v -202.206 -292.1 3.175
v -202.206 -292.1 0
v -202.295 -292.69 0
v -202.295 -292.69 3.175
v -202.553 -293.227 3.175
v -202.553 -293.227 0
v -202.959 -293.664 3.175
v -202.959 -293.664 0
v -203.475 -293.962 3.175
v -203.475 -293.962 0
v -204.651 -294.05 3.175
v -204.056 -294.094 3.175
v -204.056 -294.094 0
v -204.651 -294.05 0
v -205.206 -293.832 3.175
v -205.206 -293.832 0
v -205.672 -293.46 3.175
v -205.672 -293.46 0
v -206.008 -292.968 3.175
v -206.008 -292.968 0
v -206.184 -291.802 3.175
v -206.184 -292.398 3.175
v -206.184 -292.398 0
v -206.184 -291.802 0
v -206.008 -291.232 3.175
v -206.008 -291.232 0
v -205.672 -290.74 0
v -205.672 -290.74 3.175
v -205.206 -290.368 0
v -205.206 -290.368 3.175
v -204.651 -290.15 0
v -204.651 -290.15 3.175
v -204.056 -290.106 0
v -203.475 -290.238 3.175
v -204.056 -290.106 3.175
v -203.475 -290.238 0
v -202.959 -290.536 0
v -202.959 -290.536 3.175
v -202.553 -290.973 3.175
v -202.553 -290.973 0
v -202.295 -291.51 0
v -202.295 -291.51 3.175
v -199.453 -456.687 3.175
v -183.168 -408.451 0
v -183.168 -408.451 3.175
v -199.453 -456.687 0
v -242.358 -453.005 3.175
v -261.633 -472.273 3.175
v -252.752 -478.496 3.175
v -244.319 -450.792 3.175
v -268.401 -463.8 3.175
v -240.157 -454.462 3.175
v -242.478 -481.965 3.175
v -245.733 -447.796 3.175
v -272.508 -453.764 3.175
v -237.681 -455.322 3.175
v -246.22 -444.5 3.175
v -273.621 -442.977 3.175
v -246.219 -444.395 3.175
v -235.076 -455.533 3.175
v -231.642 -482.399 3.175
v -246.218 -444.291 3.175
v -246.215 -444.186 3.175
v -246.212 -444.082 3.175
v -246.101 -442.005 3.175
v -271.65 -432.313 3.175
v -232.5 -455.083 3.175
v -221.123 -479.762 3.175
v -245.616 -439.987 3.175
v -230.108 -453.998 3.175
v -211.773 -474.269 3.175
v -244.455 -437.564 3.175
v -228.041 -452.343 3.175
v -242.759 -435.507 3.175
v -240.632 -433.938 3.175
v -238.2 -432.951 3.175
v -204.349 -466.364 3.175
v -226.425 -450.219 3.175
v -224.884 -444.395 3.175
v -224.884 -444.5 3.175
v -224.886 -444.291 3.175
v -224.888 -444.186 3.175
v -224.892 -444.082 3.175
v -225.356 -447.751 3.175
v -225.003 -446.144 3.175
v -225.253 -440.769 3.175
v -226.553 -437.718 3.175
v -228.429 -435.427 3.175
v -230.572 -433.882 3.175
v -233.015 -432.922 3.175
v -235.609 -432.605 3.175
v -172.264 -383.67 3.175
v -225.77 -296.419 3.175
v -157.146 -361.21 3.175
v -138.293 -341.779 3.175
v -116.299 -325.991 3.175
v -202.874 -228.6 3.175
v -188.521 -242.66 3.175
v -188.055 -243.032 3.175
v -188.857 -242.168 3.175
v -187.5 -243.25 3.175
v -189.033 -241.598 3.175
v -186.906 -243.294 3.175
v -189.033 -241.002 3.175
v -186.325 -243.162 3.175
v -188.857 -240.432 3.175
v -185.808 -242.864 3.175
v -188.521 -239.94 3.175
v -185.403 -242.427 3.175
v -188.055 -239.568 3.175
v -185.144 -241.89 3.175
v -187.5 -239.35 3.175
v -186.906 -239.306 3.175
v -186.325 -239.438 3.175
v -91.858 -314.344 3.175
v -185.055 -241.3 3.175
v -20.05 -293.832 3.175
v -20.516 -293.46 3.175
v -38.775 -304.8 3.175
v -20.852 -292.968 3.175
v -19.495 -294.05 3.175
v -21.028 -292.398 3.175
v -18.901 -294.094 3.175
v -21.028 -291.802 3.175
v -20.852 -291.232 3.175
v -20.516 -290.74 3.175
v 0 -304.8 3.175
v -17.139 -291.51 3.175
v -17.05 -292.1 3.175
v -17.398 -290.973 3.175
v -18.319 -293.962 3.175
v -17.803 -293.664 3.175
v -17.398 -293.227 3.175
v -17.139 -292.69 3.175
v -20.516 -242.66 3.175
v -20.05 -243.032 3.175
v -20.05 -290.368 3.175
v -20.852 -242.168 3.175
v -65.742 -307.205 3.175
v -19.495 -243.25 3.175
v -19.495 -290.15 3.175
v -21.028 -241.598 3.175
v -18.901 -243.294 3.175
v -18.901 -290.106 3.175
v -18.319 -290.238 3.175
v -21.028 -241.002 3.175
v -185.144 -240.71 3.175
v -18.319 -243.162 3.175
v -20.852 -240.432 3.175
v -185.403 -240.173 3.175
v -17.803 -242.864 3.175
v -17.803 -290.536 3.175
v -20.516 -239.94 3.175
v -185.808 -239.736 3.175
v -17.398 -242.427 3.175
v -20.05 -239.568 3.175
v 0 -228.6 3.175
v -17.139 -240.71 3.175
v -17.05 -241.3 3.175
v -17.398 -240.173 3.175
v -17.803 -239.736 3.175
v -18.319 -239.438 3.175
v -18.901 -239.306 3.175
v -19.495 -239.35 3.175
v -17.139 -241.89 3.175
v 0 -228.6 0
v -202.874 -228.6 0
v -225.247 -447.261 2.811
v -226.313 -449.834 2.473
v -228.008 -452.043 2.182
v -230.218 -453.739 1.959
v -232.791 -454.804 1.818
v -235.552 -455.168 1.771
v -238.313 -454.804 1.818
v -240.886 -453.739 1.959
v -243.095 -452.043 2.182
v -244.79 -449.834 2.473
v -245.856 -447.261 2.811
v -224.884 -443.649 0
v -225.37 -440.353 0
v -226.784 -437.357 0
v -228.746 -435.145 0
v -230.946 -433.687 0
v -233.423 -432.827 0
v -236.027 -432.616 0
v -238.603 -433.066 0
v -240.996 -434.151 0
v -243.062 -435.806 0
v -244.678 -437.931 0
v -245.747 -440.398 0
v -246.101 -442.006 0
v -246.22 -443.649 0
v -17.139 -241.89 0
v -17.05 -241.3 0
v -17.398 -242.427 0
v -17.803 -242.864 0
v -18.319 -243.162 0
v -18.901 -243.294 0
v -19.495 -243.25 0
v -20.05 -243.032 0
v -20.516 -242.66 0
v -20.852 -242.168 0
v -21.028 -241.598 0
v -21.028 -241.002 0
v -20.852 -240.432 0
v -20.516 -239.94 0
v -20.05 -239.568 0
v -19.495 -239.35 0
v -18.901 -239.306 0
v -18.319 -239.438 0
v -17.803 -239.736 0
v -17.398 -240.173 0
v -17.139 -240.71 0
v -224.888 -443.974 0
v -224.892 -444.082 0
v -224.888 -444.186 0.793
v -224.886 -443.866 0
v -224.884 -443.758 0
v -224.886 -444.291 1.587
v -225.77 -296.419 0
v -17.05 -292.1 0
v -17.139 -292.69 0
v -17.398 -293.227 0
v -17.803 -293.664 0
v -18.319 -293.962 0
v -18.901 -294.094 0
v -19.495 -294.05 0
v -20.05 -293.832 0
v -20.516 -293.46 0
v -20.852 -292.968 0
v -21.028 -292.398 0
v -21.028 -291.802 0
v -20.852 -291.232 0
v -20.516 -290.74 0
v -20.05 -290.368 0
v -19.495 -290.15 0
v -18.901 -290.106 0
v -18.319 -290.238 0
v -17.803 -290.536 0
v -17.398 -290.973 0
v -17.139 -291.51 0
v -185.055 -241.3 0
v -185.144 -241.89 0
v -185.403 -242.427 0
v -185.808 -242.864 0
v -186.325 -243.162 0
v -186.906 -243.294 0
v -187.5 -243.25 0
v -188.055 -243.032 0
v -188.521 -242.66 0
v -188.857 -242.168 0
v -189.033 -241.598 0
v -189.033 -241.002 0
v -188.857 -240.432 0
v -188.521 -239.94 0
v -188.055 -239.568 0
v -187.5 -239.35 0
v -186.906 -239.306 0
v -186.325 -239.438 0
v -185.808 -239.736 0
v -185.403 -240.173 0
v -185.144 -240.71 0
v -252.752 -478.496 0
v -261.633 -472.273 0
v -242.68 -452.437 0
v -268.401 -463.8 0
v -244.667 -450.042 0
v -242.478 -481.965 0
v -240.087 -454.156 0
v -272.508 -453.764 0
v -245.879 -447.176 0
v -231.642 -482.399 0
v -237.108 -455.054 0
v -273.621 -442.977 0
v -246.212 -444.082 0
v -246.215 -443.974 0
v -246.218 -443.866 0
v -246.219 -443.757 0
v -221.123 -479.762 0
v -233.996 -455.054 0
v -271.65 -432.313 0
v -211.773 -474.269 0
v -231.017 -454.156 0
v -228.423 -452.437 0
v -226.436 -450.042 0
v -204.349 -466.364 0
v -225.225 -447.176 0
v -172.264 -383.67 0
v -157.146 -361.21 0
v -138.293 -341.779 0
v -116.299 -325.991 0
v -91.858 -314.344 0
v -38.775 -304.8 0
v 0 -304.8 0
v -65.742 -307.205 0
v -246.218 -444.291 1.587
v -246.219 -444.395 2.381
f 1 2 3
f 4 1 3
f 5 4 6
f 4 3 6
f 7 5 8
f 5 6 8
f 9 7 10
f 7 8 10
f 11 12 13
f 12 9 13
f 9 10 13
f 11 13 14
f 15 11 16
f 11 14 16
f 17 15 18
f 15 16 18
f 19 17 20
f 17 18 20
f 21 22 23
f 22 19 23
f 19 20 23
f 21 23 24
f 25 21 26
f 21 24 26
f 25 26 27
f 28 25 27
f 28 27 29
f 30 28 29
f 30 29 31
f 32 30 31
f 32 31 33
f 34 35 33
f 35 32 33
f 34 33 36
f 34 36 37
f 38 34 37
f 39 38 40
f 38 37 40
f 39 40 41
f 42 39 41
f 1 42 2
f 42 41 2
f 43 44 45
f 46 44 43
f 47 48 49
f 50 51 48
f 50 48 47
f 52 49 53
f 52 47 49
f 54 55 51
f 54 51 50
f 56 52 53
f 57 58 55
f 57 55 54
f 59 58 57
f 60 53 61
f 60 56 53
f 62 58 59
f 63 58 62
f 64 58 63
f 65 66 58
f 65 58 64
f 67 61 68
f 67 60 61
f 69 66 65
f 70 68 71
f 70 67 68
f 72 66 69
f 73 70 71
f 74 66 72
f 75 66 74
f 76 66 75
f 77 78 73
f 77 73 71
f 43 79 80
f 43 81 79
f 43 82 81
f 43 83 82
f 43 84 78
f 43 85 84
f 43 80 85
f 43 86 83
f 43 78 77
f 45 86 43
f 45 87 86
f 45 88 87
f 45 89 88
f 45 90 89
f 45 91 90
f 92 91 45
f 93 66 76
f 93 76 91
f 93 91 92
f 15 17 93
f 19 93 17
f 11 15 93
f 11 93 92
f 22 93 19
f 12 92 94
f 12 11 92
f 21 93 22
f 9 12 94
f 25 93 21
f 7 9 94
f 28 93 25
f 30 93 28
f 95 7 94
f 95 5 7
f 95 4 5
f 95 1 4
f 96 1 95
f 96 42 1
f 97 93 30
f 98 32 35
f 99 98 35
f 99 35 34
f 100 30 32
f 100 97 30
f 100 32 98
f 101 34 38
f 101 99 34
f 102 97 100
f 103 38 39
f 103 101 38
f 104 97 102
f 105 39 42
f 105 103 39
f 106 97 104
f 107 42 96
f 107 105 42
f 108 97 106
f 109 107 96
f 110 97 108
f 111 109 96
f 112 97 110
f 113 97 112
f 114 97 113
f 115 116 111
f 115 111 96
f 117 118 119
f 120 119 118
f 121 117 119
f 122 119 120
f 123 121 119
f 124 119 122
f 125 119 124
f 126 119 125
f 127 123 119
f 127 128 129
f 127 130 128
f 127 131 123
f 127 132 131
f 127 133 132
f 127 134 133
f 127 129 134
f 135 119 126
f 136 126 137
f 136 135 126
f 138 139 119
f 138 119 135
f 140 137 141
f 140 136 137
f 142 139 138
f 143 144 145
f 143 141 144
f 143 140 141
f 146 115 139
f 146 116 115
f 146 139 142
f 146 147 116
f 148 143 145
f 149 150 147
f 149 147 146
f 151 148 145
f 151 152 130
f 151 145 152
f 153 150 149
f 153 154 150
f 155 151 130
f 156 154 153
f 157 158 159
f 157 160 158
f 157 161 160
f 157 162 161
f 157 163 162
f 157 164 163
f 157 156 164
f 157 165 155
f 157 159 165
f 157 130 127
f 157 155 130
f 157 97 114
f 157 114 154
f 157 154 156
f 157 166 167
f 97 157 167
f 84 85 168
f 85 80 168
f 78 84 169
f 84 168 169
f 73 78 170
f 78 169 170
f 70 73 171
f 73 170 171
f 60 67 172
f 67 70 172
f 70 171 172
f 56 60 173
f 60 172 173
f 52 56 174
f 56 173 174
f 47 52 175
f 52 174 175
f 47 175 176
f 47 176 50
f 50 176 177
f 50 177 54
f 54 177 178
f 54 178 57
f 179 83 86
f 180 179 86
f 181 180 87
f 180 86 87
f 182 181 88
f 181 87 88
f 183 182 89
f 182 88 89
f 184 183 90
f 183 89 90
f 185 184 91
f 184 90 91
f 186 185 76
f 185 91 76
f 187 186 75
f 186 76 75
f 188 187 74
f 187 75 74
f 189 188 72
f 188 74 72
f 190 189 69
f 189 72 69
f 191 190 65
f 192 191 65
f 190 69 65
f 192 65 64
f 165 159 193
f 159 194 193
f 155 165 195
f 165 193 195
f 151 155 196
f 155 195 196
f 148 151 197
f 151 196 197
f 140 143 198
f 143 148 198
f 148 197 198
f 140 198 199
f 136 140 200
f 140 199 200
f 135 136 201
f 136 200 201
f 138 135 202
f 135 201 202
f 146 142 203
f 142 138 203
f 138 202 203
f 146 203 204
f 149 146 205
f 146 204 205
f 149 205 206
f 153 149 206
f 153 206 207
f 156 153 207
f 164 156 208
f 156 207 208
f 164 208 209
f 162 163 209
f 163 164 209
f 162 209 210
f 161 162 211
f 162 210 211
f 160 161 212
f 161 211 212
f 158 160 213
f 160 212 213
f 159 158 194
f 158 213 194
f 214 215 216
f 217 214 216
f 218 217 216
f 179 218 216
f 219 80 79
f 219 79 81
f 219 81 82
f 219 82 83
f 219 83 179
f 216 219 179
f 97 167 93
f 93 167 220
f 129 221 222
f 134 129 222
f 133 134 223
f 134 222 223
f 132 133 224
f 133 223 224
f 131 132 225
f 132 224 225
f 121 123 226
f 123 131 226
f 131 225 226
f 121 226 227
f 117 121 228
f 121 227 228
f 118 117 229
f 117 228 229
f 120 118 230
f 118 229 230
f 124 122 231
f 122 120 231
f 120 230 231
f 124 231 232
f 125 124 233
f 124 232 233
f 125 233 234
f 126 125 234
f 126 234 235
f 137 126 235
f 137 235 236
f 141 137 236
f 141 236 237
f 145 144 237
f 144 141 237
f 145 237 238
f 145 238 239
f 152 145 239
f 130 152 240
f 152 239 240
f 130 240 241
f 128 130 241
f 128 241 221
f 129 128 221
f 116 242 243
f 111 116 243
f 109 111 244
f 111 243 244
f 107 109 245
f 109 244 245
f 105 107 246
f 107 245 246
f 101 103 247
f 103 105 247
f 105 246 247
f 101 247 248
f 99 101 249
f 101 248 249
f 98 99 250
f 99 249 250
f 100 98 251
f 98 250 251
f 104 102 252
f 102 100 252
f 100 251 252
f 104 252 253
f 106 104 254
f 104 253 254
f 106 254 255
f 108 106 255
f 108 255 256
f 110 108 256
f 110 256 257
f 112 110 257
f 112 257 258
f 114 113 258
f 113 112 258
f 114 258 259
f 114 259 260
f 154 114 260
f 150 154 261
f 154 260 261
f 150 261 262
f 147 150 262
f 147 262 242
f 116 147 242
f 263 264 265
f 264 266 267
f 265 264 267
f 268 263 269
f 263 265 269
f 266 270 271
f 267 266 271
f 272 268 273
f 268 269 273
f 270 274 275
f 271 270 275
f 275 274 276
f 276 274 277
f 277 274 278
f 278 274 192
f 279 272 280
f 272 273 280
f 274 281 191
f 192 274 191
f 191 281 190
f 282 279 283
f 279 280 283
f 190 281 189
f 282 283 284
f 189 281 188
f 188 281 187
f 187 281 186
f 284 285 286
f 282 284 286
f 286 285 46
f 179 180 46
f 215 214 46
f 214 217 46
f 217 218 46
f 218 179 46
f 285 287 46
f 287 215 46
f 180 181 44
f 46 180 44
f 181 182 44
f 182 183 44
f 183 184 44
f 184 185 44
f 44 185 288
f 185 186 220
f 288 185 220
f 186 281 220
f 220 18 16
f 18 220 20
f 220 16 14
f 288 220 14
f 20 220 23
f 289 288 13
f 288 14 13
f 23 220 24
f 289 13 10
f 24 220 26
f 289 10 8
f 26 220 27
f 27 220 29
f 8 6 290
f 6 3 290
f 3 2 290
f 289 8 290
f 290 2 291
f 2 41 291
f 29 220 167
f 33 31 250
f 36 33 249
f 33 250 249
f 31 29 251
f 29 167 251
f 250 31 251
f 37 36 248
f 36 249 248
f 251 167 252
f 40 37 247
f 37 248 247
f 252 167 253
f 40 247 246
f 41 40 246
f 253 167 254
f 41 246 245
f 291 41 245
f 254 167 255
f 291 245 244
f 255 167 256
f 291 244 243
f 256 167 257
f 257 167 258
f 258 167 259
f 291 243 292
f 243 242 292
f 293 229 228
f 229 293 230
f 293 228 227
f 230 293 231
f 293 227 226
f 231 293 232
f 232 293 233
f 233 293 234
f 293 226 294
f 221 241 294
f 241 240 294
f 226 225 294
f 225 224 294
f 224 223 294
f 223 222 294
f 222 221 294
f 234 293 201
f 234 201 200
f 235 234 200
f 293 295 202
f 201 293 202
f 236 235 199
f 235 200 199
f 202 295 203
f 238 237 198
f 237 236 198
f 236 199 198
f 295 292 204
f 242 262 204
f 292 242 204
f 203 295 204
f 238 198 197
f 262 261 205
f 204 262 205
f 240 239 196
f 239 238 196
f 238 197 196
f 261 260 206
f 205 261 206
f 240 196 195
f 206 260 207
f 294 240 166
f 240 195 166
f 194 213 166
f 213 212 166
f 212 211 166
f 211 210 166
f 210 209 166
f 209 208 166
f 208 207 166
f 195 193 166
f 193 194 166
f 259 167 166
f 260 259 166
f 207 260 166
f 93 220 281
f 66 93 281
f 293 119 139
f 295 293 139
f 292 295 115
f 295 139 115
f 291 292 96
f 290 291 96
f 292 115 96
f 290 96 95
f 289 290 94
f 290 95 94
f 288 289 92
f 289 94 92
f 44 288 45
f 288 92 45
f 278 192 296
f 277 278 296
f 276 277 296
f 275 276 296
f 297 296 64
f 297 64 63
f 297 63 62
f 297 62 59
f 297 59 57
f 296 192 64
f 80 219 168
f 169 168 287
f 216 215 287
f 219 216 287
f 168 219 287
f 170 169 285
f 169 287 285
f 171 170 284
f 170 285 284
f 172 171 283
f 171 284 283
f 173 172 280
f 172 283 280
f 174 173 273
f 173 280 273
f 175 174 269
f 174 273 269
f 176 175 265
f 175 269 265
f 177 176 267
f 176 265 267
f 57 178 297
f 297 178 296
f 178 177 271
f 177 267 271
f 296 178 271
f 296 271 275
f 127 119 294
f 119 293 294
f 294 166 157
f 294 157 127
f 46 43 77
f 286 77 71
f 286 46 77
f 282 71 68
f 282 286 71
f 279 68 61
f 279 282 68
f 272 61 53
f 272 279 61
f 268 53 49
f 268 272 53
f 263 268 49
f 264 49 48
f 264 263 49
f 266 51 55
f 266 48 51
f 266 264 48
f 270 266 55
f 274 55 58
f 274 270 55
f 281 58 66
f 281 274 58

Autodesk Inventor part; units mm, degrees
ref_plane "YZ Plane" through (0, 0, 0) normal (1, 0, 0) x (0, 1, 0)
ref_plane "XZ Plane" through (0, 0, 0) normal (0, 1, 0) x (-1, 0, 0)
ref_plane "XY Plane" through (0, 0, 0) normal (0, 0, 1) x (1, 0, 0)
sketch "Sketch1" plane through (0, 0, 0) normal (0, 0, 1) x (1, 0, 0)
  arc A0 (219.754, -304.8) -> (225.7704, -296.4188) centre (219.754, -298.45) ccw projected
  line L0 (225.7704, -296.4188) -> (30.0819, 283.206) projected
  arc A1 (30.0819, 283.206) -> (-30.0819, 283.206) centre (0, 273.05) ccw projected
  line L1 (-30.0819, 283.206) -> (-225.7704, -296.4188) projected
  arc A2 (-225.7704, -296.4188) -> (-219.754, -304.8) centre (-219.754, -298.45) ccw projected
  line L2 (-219.754, -304.8) -> (219.754, -304.8) projected
  line L3 (-38.1, -17.4222) -> (-38.1, -222.25) projected
  arc A3 (-44.45, -228.6) -> (-38.1, -222.25) centre (-44.45, -222.25) ccw projected
  line L4 (-44.45, -228.6) -> (-113.6024, -228.6) projected
  arc A4 (-119.6188, -220.2188) -> (-113.6024, -228.6) centre (-113.6024, -222.25) ccw projected
  line L5 (-119.6188, -220.2188) -> (-50.4664, -15.391) projected
  arc A5 (-38.1, -17.4222) -> (-50.4664, -15.391) centre (-44.45, -17.4222) ccw projected
  line L6 (113.6024, -228.6) -> (44.45, -228.6) projected
  arc A6 (38.1, -222.25) -> (44.45, -228.6) centre (44.45, -222.25) ccw projected
  line L7 (38.1, -222.25) -> (38.1, -17.4222) projected
  arc A7 (50.4664, -15.391) -> (38.1, -17.4222) centre (44.45, -17.4222) ccw projected
  line L8 (50.4664, -15.391) -> (119.6188, -220.2188) projected
  arc A8 (113.6024, -228.6) -> (119.6188, -220.2188) centre (113.6024, -222.25) ccw projected
  circle A9 centre (-204.2059, -292.1) radius 2 projected
  circle A10 centre (-187.0552, -241.3) radius 2 projected
  circle A11 centre (187.0552, -241.3) radius 2 projected
  circle A12 centre (204.2059, -292.1) radius 2 projected
  circle A13 centre (19.05, -241.3) radius 2 projected
  circle A14 centre (19.05, -292.1) radius 2 projected
  circle A15 centre (-19.05, -292.1) radius 2 projected
  circle A16 centre (-19.05, -241.3) radius 2 projected
  circle A17 centre (8.89, 288.4479) radius 2 projected
  circle A18 centre (-8.89, 288.4479) radius 2 projected
  circle A19 centre (-17.78, 273.05) radius 2 projected
  circle A20 centre (-8.89, 257.6521) radius 2 projected
  circle A21 centre (8.89, 257.6521) radius 2 projected
  circle A22 centre (17.78, 273.05) radius 2 projected
  line L9 (0, -228.6) -> (-202.8739, -228.6)
  line L10 (0, -228.6) -> (0, -304.8)
  line L11 (-119.6188, -220.2188) -> (-208.2019, -482.6)
  line L12 (-225.7704, -296.4188) -> (-288.6275, -482.6)
  line L13 (-288.6275, -482.6) -> (-208.2019, -482.6)
  circle A23 centre (-235.5517, -444.5) radius 38.1
  circle A24 centre (-235.5517, -444.5) radius 10.668
  ellipse E0 centre (0, 273.05) end of major axis (-12.7, 273.05) minor radius 12.2673 projected
  point P0 (0, 0)
  point P1 (-271.6499, -432.3128)
  point P2 (-199.4535, -456.6872)
  point P3 (-148.1744, -304.8)
  dimension "d0" = 21.336
  dimension "d1" = 254
extrude "Extrusion1" add sketch "Sketch1" along normal blind 3.175 contours L2 L11 L9 L4 L10 | L11 A23 L12 A2 L2 | L2 A2 L1 L9 L11 | A23
fillet "Fillet1" radius 152.4 1 edges at (-148.1744, -304.8, 1.5875)
ref_plane "Work Plane1" through (-235.5517, -444.5, 3.175) normal (0, -0.258819, 0.9659258) x (-1, 0, 0)
sketch "Sketch2" plane through (-235.5517, -444.5, 3.175) normal (0, -0.258819, 0.9659258) x (-1, 0, 0)
  ellipse E0 centre (0, 0) end of major axis (10.668, 0) minor radius 10.3045 projected
  circle A0 centre (0, 0) radius 10.668
  point P0 (-235.5517, -428.5323)
  dimension "d6" = 21.336
sketch "Sketch3" plane through (0, 0, 3.175) normal (0, 0, 1) x (1, 0, 0)
  point P0 (0, 0)
extrude "Extrusion2" cut sketch "Sketch2" along normal through all both and the other way through all
sketch "Sketch4" plane through (0, 0, 3.175) normal (0, 0, 1) x (1, 0, 0)
  ellipse E0 centre (-235.5517, -444.5) end of major axis (-235.5517, -455.5443) minor radius 10.668 (-224.8837, -444.5) -> (-246.2197, -444.5) ccw projected
  ellipse E1 centre (-235.5517, -444.5) end of major axis (-235.5517, -455.5443) minor radius 10.668 (-246.2197, -444.5) -> (-224.8837, -444.5) ccw projected
  line L0 (-202.8739, -228.6) -> (-271.6499, -432.3128) projected
  arc A0 (-271.6499, -432.3128) -> (-199.4535, -456.6872) centre (-235.5517, -444.5) ccw projected
  arc A1 (-38.7755, -304.8) -> (-183.1684, -408.4512) centre (-38.7755, -457.2) ccw projected
  line L1 (-38.7755, -304.8) -> (0, -304.8) projected
  line L2 (0, -304.8) -> (0, -228.6) projected
  line L3 (0, -228.6) -> (-202.8739, -228.6) projected
  circle A2 centre (-19.05, -241.3) radius 2 projected
  circle A3 centre (-19.05, -292.1) radius 2 projected
  circle A4 centre (-204.2059, -292.1) radius 2 projected
  circle A5 centre (-187.0552, -241.3) radius 2 projected
  circle A6 centre (-187.0552, -241.3) radius 2 projected
  circle A7 centre (-204.2059, -292.1) radius 2 projected
  ellipse E2 centre (-235.5517, -443.6493) end of major axis (-235.5517, -454.6936) minor radius 10.668 (-224.8919, -444.082) -> (-246.2115, -444.082) ccw projected
  arc A8 (-246.2115, -444.082) -> (-224.8919, -444.082) centre (-235.5517, -444.5) ccw projected
  circle A9 centre (-19.05, -292.1) radius 2 projected
  circle A10 centre (-19.05, -241.3) radius 2 projected
  line L4 (-202.8739, -228.6) -> (-271.6499, -432.3128) projected
  line L5 (0, -228.6) -> (-202.8739, -228.6) projected
  line L6 (0, -304.8) -> (0, -228.6) projected
  line L7 (-38.7755, -304.8) -> (0, -304.8) projected
  arc A11 (-38.7755, -304.8) -> (-183.1684, -408.4512) centre (-38.7755, -457.2) ccw projected
  arc A12 (-271.6499, -432.3128) -> (-199.4535, -456.6872) centre (-235.5517, -444.5) ccw projected
  line L8 (-199.4535, -456.6872) -> (-183.1684, -408.4512) projected
  line L9 (-199.4535, -456.6872) -> (-183.1684, -408.4512) projected
  point P0 (0, 0)
extrude "Extrusion3" cut sketch "Sketch4" against normal through all contours A8 E0 | E0 E2
properties part number "FrameLeg" material "MDF Medium Density Fiberboard"
